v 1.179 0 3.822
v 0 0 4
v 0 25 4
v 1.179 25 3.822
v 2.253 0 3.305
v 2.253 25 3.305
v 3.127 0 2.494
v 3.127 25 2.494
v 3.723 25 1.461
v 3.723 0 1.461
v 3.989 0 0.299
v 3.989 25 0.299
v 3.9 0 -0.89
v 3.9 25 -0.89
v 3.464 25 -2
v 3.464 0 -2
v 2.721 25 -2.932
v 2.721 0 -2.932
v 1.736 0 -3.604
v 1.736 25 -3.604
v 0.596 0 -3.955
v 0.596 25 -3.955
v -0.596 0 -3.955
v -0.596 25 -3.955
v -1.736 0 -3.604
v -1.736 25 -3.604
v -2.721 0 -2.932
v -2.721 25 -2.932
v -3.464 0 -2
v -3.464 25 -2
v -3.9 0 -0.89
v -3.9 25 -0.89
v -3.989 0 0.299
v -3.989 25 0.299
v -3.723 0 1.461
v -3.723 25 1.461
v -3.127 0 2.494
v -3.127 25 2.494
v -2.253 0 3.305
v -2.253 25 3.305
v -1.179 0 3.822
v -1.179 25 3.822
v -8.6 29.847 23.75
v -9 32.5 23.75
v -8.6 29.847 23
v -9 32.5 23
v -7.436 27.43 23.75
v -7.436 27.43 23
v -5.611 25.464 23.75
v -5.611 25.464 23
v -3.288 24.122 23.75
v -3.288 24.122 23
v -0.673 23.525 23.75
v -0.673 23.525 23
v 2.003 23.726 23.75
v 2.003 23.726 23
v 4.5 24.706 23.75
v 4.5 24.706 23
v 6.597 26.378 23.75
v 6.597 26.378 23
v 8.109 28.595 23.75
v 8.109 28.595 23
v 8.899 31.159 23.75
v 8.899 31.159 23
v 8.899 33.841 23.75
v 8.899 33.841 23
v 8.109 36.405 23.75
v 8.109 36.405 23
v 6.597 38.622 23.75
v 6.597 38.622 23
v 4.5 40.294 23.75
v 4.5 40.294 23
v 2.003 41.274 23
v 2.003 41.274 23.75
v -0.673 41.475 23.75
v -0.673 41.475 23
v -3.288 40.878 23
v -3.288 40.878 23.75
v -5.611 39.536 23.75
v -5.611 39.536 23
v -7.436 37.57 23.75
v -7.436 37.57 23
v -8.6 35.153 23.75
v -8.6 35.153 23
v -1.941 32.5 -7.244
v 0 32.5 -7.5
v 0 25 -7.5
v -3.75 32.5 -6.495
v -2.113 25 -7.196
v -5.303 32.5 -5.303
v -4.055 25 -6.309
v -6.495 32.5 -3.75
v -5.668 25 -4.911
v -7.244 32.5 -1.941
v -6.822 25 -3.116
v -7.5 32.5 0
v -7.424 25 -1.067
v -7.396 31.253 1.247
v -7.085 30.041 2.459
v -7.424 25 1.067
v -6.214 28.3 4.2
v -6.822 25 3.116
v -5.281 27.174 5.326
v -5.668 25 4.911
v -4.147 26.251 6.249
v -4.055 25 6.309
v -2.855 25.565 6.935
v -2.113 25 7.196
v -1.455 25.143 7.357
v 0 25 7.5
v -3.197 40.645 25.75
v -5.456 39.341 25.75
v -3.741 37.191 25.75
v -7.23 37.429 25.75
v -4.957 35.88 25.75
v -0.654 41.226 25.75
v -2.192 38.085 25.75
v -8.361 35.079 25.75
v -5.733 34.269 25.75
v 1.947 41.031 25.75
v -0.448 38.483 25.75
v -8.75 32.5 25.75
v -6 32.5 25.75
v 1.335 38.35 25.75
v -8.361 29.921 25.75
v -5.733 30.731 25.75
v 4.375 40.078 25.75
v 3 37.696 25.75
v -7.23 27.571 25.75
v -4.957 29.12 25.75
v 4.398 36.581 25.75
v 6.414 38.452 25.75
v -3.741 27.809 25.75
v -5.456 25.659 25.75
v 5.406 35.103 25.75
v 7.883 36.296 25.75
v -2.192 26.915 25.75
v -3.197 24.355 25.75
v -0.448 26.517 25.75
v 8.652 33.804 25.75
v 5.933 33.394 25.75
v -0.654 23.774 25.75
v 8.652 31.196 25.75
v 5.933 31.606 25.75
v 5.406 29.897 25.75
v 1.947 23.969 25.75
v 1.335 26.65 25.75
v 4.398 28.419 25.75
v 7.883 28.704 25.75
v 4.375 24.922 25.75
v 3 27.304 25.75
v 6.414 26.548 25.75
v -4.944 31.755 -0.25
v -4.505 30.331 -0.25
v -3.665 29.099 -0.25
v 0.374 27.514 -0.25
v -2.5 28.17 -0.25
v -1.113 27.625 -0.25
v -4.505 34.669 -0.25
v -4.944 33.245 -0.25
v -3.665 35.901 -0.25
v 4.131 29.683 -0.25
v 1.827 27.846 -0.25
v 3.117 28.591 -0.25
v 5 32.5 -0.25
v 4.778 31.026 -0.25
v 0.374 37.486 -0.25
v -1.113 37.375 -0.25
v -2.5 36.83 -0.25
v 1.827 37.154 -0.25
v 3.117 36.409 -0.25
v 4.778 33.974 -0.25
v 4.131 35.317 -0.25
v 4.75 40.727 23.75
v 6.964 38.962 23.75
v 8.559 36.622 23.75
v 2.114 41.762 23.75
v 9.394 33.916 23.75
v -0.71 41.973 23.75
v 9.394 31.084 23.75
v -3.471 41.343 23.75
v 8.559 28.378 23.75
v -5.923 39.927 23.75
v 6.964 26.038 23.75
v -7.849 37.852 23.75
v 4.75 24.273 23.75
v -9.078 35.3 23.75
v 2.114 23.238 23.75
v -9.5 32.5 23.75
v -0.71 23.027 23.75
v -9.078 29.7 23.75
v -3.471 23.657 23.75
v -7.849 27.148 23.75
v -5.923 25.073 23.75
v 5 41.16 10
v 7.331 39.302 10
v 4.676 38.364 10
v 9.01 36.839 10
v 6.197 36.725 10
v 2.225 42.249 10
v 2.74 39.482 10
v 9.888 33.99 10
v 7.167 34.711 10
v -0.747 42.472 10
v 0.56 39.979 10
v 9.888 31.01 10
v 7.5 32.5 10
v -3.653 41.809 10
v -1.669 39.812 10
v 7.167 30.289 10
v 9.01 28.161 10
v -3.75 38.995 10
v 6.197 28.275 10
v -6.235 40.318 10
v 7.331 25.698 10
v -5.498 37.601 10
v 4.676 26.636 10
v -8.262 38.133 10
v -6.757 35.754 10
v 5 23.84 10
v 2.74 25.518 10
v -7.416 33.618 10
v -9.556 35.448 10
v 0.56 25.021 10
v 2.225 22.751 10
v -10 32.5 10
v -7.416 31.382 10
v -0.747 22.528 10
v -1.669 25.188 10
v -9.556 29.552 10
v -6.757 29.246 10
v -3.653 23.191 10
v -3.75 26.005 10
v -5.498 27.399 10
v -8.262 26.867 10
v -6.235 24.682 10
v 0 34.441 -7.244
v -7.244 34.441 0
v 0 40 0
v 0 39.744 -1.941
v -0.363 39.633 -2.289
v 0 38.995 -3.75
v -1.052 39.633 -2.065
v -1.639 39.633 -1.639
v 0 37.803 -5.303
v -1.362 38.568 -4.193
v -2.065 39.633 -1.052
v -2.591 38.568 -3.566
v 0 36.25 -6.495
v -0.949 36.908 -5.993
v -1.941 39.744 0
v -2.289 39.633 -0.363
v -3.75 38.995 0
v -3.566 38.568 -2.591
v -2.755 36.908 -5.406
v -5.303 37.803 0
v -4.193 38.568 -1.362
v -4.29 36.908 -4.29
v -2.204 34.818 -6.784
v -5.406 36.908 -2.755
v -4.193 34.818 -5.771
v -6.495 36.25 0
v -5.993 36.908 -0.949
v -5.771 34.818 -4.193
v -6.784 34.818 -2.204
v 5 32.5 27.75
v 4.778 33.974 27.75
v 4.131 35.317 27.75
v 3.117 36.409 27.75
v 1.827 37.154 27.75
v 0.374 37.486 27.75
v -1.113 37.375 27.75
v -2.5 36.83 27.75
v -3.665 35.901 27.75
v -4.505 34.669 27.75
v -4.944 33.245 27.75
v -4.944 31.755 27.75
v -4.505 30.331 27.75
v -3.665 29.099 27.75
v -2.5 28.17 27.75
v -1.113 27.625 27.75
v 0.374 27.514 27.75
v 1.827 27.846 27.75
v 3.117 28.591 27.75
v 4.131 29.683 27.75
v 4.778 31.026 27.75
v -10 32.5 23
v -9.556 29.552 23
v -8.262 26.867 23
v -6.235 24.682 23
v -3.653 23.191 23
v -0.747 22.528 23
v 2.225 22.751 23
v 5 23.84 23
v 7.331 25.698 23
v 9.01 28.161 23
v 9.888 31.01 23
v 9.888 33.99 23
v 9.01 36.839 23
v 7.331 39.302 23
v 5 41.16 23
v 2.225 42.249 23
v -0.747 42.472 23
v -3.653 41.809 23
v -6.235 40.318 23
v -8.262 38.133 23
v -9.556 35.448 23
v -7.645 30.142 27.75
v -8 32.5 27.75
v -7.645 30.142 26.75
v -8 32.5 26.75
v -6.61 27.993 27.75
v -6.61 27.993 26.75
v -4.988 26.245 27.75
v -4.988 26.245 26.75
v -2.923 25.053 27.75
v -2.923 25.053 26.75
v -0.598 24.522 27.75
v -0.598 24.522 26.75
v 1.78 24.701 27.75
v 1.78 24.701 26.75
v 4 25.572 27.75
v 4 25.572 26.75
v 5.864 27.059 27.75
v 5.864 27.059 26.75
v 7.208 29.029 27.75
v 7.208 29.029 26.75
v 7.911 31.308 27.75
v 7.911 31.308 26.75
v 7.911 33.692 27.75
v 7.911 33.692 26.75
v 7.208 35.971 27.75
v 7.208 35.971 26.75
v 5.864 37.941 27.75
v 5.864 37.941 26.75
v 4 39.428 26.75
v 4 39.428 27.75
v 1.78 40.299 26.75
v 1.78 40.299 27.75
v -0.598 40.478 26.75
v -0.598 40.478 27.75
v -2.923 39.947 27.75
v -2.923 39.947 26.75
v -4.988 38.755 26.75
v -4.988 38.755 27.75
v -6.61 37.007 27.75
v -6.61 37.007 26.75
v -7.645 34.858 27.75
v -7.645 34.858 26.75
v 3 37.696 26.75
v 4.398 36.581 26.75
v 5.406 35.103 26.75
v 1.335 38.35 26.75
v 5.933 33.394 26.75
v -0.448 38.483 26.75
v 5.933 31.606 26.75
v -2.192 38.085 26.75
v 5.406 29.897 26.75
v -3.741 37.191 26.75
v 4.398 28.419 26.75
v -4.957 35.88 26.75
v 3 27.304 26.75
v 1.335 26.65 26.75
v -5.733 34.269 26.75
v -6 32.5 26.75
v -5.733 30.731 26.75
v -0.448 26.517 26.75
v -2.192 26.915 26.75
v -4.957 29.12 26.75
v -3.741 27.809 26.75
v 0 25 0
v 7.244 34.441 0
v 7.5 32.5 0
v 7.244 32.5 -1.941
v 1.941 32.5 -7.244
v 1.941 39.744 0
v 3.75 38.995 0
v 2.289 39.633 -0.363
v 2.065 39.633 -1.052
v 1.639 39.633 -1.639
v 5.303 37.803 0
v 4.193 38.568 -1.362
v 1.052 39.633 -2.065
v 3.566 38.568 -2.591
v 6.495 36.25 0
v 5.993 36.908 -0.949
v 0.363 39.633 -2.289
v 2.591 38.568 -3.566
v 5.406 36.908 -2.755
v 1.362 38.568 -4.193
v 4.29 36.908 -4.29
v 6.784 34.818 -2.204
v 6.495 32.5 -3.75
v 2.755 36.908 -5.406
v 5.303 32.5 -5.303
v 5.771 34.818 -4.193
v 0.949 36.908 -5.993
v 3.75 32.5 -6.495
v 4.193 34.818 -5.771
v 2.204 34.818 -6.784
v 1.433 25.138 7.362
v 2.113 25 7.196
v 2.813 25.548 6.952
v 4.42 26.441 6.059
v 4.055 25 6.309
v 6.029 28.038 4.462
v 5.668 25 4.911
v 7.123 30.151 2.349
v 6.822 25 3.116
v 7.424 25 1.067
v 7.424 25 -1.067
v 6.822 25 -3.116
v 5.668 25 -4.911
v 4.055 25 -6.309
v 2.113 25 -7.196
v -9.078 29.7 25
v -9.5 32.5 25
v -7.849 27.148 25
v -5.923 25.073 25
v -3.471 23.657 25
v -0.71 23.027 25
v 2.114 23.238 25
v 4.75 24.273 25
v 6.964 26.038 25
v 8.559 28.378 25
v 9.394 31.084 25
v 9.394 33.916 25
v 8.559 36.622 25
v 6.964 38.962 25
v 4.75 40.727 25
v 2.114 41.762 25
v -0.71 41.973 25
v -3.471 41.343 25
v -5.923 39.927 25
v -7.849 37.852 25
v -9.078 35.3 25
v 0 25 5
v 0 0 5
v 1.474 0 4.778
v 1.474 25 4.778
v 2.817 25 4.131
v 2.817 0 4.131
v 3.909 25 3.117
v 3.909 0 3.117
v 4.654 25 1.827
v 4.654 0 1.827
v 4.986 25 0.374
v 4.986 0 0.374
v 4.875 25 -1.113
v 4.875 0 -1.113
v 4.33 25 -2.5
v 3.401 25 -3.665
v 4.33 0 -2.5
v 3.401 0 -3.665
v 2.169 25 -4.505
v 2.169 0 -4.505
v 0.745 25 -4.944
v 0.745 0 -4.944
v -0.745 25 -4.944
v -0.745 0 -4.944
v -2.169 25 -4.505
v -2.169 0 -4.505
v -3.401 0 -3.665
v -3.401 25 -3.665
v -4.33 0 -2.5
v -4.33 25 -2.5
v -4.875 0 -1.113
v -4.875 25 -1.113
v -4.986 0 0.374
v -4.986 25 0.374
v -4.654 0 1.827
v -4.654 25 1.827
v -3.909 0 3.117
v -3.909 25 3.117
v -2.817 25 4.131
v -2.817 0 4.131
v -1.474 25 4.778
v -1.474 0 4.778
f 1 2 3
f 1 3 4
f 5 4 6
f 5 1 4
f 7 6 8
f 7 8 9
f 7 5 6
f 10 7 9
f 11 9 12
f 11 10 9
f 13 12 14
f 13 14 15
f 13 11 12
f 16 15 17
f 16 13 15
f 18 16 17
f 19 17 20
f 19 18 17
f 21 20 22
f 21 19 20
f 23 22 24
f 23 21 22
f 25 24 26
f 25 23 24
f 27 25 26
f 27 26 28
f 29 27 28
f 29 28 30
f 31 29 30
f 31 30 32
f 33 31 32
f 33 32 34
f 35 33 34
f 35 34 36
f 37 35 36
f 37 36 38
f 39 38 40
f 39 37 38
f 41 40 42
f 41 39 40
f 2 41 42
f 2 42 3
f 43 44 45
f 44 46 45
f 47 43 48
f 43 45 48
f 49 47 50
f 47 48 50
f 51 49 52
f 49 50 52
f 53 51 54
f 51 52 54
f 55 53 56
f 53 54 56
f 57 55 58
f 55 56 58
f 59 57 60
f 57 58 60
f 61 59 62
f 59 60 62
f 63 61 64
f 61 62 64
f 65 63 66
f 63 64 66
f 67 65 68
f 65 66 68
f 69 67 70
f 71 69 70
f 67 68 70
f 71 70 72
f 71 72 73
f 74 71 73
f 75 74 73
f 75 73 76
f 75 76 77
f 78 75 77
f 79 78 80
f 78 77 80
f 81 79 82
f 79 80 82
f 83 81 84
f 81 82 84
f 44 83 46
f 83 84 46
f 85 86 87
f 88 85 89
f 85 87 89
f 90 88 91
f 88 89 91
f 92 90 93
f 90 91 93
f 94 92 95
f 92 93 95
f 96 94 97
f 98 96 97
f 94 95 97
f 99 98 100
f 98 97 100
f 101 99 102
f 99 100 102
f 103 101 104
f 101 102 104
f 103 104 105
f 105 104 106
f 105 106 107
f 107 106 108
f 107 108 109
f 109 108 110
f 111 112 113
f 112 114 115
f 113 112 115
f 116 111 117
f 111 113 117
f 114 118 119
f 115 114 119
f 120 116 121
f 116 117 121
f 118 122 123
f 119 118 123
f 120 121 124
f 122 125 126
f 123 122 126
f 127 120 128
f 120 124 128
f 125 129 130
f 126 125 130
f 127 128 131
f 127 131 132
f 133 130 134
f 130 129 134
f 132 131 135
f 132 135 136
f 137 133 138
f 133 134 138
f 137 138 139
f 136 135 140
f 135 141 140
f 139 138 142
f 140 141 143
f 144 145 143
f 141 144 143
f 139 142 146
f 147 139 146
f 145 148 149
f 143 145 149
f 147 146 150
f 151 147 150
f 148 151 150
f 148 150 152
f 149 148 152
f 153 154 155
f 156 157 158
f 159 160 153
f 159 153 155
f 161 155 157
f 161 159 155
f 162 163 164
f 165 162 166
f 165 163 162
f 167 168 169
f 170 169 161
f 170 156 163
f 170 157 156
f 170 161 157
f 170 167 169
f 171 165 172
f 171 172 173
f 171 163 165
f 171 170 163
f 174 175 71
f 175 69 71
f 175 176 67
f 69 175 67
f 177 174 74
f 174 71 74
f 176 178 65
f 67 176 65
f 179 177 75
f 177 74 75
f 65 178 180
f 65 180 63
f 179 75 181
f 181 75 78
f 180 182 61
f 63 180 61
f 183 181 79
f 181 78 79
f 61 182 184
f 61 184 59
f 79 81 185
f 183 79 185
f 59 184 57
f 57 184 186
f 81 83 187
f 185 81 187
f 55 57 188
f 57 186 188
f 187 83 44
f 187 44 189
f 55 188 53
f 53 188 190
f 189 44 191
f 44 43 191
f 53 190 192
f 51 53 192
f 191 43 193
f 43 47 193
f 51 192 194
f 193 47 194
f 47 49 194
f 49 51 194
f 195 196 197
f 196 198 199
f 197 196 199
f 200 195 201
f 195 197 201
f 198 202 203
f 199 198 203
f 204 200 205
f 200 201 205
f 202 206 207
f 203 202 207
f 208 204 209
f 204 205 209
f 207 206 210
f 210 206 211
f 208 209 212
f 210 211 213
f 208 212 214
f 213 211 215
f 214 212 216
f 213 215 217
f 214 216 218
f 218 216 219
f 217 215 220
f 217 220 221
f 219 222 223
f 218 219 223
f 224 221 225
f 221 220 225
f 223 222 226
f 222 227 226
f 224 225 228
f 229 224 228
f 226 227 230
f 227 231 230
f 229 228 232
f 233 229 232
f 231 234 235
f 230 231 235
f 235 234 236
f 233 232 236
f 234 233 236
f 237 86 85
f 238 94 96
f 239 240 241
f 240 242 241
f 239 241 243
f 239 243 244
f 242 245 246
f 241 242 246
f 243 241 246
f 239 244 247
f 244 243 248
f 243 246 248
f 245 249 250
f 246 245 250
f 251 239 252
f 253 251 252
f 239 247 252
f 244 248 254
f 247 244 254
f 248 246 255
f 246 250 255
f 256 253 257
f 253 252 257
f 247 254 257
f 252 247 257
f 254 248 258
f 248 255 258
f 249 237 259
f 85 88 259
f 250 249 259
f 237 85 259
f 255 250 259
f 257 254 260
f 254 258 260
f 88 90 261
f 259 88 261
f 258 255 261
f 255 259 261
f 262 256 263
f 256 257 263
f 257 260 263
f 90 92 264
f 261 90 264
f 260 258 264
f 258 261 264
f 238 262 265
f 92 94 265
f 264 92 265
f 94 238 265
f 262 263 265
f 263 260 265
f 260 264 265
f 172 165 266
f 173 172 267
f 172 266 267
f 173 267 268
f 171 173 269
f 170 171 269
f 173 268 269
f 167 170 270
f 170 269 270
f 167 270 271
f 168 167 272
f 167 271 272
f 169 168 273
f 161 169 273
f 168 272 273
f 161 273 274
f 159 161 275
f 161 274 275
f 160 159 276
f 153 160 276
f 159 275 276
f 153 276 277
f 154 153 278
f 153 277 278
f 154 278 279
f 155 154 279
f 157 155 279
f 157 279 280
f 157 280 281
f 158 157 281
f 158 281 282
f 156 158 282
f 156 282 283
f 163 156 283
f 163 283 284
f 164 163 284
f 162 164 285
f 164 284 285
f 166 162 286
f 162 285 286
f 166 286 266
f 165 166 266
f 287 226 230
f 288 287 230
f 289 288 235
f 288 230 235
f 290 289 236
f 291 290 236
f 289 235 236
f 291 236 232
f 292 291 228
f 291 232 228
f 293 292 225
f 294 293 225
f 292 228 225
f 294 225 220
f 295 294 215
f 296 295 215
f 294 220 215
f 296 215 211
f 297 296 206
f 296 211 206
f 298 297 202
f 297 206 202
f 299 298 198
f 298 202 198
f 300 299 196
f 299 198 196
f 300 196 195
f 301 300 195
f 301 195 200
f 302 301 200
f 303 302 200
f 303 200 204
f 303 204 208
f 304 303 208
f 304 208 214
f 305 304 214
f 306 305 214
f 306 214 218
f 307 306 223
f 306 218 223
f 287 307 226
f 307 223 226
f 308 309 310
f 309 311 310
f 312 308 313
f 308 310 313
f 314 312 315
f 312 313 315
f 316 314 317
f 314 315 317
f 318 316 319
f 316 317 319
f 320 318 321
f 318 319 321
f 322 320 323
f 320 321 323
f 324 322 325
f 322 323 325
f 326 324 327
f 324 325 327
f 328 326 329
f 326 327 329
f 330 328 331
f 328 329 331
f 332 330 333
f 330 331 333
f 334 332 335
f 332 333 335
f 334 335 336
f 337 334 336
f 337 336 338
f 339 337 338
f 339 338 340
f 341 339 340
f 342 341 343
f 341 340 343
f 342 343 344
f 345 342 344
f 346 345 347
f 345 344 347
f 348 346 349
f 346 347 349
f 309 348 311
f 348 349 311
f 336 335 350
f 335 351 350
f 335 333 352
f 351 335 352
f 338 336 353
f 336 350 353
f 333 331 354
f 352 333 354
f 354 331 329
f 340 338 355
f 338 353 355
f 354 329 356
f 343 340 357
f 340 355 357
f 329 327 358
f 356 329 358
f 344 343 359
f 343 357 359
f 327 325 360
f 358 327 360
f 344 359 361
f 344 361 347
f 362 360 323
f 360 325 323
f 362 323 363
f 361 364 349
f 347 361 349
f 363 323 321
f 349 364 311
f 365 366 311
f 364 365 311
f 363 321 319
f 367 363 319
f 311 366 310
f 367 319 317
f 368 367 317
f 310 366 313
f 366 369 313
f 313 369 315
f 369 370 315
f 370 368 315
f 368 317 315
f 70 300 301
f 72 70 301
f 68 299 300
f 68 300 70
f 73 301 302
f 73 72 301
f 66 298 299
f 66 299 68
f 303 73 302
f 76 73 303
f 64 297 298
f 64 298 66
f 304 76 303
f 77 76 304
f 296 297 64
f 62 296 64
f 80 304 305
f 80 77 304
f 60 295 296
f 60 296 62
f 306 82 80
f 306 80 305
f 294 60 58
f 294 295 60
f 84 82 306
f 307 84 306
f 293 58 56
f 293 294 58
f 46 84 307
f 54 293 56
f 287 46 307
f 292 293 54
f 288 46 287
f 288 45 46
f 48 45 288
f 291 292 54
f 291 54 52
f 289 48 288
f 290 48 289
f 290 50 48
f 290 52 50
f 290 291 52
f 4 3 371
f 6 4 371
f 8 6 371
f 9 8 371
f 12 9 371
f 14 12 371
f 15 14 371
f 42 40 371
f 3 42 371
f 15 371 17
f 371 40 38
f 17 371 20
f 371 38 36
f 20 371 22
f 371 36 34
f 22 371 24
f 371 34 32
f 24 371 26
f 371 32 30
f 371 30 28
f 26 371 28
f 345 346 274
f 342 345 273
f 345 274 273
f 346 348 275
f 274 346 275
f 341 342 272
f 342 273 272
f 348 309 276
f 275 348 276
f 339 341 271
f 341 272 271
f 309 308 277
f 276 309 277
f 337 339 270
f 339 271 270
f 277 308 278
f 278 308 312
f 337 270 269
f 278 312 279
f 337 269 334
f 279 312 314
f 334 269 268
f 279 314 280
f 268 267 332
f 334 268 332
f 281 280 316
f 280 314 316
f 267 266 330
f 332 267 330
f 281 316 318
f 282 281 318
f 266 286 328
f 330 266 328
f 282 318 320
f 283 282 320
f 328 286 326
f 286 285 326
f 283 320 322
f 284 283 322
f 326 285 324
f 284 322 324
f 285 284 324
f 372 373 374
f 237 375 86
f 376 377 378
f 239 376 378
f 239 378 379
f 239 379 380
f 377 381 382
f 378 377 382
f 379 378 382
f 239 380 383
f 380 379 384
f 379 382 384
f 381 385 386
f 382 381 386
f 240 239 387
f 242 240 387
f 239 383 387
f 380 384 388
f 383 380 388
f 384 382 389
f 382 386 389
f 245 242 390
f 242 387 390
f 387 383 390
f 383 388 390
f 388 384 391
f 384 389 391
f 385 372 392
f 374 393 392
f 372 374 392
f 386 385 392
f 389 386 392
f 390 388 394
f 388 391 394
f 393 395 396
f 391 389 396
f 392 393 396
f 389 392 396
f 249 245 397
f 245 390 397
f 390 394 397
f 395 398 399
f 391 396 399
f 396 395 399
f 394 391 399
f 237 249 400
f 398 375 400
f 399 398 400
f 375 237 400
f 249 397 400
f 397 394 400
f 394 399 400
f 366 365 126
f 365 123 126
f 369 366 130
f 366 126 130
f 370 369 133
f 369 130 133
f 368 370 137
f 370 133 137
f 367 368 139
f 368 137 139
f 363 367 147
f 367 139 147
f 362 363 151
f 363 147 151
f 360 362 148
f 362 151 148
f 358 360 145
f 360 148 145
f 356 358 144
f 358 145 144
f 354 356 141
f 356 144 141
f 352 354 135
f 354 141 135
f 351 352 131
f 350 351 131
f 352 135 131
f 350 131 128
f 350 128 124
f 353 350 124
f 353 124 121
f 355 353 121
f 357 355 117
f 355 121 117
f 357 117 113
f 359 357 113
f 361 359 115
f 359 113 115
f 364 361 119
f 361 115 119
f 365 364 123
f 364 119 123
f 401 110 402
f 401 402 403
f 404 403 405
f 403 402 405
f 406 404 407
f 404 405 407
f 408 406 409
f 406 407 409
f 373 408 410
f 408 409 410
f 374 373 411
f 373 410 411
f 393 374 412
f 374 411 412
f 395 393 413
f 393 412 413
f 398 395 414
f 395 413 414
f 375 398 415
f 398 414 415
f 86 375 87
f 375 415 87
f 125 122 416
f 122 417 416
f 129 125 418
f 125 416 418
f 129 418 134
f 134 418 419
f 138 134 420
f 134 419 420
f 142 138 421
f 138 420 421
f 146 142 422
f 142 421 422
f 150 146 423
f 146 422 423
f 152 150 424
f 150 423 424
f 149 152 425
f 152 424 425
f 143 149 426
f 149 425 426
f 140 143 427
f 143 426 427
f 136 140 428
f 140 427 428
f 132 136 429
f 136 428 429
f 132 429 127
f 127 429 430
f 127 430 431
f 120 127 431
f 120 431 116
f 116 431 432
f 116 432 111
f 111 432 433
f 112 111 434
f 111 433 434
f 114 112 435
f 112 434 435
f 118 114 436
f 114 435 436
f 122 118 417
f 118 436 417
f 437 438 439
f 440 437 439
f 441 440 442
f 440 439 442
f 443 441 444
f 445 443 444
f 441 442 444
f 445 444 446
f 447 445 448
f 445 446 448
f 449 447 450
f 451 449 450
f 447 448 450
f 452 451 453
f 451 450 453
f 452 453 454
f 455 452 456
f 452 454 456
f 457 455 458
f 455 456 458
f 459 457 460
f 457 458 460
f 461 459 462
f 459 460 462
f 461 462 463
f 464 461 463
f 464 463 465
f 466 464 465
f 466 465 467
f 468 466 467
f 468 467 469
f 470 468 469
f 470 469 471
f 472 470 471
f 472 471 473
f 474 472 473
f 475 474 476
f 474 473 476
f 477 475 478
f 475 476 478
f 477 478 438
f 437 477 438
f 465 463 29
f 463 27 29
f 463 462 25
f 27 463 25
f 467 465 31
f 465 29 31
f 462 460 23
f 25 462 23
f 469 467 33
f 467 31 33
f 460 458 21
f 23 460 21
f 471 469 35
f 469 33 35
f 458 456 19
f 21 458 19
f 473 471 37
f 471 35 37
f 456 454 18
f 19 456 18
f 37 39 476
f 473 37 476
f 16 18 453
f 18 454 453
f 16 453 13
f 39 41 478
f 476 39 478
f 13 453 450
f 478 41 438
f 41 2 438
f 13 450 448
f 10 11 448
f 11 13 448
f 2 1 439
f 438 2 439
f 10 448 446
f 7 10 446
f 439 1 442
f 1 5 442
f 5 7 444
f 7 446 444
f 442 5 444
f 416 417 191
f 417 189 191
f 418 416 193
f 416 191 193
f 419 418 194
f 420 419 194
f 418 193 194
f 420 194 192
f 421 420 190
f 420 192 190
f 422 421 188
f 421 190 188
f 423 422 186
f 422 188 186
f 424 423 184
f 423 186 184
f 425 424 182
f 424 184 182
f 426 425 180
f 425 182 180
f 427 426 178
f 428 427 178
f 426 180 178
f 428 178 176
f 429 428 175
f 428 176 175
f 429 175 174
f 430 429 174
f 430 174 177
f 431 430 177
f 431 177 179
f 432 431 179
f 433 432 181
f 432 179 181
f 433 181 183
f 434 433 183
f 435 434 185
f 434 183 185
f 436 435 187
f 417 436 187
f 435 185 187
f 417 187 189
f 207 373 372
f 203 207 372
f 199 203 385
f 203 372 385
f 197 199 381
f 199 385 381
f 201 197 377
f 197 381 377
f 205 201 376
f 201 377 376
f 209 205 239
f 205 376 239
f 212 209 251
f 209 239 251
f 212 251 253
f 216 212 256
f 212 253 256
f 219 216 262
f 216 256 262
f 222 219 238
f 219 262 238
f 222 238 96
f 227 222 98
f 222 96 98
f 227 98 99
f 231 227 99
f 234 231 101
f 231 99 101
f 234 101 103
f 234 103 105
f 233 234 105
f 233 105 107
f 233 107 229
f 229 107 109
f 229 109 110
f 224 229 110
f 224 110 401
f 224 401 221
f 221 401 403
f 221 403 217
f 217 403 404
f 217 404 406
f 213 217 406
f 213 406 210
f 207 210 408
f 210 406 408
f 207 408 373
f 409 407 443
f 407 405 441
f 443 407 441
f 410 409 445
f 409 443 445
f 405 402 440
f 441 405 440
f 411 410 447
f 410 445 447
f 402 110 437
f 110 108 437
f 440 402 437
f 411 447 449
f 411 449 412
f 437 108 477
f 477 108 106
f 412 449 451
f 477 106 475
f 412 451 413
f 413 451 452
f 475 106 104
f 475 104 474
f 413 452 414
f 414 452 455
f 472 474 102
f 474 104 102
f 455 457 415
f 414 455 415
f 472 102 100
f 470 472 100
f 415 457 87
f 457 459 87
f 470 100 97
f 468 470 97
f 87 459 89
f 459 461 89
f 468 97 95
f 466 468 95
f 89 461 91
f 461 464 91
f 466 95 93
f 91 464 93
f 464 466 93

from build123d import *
from build123d.topology import SkipClean

# Parameters (mm, degrees)
SKETCH_1_R          = 5
SKETCH_1_R_2        = 4
EXTRUDE_1_DEPTH     = 25
SKETCH_3_R          = 7.5
EXTRUDE_2_DEPTH     = 10
SKETCH_4_R          = 10
EXTRUDE_3_DEPTH     = 13
SKETCH_6_R          = 5
CUT_EXTRUDE_1_DEPTH = 28


with BuildPart() as part:
    # Эскиз1 → Бобышка-Вытянуть1 (new body)
    with BuildSketch(Plane(origin=(0, 0, 0), x_dir=(1, 0, 0), z_dir=(0, 1, 0))):
        with Locations(Location((0, 0, 0), (0, 0, 270))):
            Circle(SKETCH_1_R)
        with Locations(Location((0, 0, 0), (0, 0, 270))):
            Circle(SKETCH_1_R_2, mode=Mode.SUBTRACT)
    extrude(amount=EXTRUDE_1_DEPTH)

    # Эскиз2 → Повернуть1 (revolve)
    with BuildSketch(Plane.XY, mode=Mode.PRIVATE) as revolve_1_sk:
        with BuildLine():
            Line((0, 25), (0, 40))
            ThreePointArc((0, 40), (5.303300859, 37.803300859), (7.5, 32.5))
            Line((7.5, 32.5), (7.5, 25))
            Line((7.5, 25), (0, 25))
        make_face()
    revolve(revolve_1_sk.sketch.rotate(Axis((0, 25, 0), (0, 1, 0)), 90), axis=Axis((0, 25, 0), (0, 1, 0)))

    # Эскиз3 → Бобышка-Вытянуть2 (add)
    with SkipClean():  # the faces are left unmerged after this step: merging them gives an invalid solid
        with BuildSketch(Plane.XY):
            with Locations((0, 32.5)):
                Circle(SKETCH_3_R)
        extrude(amount=EXTRUDE_2_DEPTH)

    # Эскиз4 → Бобышка-Вытянуть3 (add)
    with SkipClean():  # the faces are left unmerged after this step: merging them gives an invalid solid
        with BuildSketch(Plane.XY.offset(10)):
            with Locations(Location((0, 32.5, 0), (0, 0, 180))):
                Circle(SKETCH_4_R)
        extrude(amount=EXTRUDE_3_DEPTH)

    # Эскиз5 → Повернуть3 (revolve)
    with SkipClean():  # the faces are left unmerged after this step: merging them gives an invalid solid
        with BuildSketch(Plane(origin=(0, 0, 0), x_dir=(0, 0, -1), z_dir=(1, 0, 0)), mode=Mode.PRIVATE) as revolve_3_sk:
            Polygon((-26.75, 24.5), (-26.75, 26.5), (-25.75, 26.5), (-25.75, 23.75), (-25, 23), (-23.75, 23), (-23.75, 23.5), (-23, 23.5), (-23, 28.5), (-27.75, 28.5), (-27.75, 24.5), align=None)
        revolve(revolve_3_sk.sketch.rotate(Axis((0, 32.5, 23), (0, 0, 1)), 270), axis=Axis((0, 32.5, 23), (0, 0, 1)))

    # Эскиз6 → Вырез-Вытянуть1 (cut)
    with SkipClean():  # the faces are left unmerged after this step: merging them gives an invalid solid
        with BuildSketch(Plane.XY.offset(27.75)):
            with Locations((0, 32.5)):
                Circle(SKETCH_6_R)
        extrude(amount=-CUT_EXTRUDE_1_DEPTH, mode=Mode.SUBTRACT)


solid = part.part
